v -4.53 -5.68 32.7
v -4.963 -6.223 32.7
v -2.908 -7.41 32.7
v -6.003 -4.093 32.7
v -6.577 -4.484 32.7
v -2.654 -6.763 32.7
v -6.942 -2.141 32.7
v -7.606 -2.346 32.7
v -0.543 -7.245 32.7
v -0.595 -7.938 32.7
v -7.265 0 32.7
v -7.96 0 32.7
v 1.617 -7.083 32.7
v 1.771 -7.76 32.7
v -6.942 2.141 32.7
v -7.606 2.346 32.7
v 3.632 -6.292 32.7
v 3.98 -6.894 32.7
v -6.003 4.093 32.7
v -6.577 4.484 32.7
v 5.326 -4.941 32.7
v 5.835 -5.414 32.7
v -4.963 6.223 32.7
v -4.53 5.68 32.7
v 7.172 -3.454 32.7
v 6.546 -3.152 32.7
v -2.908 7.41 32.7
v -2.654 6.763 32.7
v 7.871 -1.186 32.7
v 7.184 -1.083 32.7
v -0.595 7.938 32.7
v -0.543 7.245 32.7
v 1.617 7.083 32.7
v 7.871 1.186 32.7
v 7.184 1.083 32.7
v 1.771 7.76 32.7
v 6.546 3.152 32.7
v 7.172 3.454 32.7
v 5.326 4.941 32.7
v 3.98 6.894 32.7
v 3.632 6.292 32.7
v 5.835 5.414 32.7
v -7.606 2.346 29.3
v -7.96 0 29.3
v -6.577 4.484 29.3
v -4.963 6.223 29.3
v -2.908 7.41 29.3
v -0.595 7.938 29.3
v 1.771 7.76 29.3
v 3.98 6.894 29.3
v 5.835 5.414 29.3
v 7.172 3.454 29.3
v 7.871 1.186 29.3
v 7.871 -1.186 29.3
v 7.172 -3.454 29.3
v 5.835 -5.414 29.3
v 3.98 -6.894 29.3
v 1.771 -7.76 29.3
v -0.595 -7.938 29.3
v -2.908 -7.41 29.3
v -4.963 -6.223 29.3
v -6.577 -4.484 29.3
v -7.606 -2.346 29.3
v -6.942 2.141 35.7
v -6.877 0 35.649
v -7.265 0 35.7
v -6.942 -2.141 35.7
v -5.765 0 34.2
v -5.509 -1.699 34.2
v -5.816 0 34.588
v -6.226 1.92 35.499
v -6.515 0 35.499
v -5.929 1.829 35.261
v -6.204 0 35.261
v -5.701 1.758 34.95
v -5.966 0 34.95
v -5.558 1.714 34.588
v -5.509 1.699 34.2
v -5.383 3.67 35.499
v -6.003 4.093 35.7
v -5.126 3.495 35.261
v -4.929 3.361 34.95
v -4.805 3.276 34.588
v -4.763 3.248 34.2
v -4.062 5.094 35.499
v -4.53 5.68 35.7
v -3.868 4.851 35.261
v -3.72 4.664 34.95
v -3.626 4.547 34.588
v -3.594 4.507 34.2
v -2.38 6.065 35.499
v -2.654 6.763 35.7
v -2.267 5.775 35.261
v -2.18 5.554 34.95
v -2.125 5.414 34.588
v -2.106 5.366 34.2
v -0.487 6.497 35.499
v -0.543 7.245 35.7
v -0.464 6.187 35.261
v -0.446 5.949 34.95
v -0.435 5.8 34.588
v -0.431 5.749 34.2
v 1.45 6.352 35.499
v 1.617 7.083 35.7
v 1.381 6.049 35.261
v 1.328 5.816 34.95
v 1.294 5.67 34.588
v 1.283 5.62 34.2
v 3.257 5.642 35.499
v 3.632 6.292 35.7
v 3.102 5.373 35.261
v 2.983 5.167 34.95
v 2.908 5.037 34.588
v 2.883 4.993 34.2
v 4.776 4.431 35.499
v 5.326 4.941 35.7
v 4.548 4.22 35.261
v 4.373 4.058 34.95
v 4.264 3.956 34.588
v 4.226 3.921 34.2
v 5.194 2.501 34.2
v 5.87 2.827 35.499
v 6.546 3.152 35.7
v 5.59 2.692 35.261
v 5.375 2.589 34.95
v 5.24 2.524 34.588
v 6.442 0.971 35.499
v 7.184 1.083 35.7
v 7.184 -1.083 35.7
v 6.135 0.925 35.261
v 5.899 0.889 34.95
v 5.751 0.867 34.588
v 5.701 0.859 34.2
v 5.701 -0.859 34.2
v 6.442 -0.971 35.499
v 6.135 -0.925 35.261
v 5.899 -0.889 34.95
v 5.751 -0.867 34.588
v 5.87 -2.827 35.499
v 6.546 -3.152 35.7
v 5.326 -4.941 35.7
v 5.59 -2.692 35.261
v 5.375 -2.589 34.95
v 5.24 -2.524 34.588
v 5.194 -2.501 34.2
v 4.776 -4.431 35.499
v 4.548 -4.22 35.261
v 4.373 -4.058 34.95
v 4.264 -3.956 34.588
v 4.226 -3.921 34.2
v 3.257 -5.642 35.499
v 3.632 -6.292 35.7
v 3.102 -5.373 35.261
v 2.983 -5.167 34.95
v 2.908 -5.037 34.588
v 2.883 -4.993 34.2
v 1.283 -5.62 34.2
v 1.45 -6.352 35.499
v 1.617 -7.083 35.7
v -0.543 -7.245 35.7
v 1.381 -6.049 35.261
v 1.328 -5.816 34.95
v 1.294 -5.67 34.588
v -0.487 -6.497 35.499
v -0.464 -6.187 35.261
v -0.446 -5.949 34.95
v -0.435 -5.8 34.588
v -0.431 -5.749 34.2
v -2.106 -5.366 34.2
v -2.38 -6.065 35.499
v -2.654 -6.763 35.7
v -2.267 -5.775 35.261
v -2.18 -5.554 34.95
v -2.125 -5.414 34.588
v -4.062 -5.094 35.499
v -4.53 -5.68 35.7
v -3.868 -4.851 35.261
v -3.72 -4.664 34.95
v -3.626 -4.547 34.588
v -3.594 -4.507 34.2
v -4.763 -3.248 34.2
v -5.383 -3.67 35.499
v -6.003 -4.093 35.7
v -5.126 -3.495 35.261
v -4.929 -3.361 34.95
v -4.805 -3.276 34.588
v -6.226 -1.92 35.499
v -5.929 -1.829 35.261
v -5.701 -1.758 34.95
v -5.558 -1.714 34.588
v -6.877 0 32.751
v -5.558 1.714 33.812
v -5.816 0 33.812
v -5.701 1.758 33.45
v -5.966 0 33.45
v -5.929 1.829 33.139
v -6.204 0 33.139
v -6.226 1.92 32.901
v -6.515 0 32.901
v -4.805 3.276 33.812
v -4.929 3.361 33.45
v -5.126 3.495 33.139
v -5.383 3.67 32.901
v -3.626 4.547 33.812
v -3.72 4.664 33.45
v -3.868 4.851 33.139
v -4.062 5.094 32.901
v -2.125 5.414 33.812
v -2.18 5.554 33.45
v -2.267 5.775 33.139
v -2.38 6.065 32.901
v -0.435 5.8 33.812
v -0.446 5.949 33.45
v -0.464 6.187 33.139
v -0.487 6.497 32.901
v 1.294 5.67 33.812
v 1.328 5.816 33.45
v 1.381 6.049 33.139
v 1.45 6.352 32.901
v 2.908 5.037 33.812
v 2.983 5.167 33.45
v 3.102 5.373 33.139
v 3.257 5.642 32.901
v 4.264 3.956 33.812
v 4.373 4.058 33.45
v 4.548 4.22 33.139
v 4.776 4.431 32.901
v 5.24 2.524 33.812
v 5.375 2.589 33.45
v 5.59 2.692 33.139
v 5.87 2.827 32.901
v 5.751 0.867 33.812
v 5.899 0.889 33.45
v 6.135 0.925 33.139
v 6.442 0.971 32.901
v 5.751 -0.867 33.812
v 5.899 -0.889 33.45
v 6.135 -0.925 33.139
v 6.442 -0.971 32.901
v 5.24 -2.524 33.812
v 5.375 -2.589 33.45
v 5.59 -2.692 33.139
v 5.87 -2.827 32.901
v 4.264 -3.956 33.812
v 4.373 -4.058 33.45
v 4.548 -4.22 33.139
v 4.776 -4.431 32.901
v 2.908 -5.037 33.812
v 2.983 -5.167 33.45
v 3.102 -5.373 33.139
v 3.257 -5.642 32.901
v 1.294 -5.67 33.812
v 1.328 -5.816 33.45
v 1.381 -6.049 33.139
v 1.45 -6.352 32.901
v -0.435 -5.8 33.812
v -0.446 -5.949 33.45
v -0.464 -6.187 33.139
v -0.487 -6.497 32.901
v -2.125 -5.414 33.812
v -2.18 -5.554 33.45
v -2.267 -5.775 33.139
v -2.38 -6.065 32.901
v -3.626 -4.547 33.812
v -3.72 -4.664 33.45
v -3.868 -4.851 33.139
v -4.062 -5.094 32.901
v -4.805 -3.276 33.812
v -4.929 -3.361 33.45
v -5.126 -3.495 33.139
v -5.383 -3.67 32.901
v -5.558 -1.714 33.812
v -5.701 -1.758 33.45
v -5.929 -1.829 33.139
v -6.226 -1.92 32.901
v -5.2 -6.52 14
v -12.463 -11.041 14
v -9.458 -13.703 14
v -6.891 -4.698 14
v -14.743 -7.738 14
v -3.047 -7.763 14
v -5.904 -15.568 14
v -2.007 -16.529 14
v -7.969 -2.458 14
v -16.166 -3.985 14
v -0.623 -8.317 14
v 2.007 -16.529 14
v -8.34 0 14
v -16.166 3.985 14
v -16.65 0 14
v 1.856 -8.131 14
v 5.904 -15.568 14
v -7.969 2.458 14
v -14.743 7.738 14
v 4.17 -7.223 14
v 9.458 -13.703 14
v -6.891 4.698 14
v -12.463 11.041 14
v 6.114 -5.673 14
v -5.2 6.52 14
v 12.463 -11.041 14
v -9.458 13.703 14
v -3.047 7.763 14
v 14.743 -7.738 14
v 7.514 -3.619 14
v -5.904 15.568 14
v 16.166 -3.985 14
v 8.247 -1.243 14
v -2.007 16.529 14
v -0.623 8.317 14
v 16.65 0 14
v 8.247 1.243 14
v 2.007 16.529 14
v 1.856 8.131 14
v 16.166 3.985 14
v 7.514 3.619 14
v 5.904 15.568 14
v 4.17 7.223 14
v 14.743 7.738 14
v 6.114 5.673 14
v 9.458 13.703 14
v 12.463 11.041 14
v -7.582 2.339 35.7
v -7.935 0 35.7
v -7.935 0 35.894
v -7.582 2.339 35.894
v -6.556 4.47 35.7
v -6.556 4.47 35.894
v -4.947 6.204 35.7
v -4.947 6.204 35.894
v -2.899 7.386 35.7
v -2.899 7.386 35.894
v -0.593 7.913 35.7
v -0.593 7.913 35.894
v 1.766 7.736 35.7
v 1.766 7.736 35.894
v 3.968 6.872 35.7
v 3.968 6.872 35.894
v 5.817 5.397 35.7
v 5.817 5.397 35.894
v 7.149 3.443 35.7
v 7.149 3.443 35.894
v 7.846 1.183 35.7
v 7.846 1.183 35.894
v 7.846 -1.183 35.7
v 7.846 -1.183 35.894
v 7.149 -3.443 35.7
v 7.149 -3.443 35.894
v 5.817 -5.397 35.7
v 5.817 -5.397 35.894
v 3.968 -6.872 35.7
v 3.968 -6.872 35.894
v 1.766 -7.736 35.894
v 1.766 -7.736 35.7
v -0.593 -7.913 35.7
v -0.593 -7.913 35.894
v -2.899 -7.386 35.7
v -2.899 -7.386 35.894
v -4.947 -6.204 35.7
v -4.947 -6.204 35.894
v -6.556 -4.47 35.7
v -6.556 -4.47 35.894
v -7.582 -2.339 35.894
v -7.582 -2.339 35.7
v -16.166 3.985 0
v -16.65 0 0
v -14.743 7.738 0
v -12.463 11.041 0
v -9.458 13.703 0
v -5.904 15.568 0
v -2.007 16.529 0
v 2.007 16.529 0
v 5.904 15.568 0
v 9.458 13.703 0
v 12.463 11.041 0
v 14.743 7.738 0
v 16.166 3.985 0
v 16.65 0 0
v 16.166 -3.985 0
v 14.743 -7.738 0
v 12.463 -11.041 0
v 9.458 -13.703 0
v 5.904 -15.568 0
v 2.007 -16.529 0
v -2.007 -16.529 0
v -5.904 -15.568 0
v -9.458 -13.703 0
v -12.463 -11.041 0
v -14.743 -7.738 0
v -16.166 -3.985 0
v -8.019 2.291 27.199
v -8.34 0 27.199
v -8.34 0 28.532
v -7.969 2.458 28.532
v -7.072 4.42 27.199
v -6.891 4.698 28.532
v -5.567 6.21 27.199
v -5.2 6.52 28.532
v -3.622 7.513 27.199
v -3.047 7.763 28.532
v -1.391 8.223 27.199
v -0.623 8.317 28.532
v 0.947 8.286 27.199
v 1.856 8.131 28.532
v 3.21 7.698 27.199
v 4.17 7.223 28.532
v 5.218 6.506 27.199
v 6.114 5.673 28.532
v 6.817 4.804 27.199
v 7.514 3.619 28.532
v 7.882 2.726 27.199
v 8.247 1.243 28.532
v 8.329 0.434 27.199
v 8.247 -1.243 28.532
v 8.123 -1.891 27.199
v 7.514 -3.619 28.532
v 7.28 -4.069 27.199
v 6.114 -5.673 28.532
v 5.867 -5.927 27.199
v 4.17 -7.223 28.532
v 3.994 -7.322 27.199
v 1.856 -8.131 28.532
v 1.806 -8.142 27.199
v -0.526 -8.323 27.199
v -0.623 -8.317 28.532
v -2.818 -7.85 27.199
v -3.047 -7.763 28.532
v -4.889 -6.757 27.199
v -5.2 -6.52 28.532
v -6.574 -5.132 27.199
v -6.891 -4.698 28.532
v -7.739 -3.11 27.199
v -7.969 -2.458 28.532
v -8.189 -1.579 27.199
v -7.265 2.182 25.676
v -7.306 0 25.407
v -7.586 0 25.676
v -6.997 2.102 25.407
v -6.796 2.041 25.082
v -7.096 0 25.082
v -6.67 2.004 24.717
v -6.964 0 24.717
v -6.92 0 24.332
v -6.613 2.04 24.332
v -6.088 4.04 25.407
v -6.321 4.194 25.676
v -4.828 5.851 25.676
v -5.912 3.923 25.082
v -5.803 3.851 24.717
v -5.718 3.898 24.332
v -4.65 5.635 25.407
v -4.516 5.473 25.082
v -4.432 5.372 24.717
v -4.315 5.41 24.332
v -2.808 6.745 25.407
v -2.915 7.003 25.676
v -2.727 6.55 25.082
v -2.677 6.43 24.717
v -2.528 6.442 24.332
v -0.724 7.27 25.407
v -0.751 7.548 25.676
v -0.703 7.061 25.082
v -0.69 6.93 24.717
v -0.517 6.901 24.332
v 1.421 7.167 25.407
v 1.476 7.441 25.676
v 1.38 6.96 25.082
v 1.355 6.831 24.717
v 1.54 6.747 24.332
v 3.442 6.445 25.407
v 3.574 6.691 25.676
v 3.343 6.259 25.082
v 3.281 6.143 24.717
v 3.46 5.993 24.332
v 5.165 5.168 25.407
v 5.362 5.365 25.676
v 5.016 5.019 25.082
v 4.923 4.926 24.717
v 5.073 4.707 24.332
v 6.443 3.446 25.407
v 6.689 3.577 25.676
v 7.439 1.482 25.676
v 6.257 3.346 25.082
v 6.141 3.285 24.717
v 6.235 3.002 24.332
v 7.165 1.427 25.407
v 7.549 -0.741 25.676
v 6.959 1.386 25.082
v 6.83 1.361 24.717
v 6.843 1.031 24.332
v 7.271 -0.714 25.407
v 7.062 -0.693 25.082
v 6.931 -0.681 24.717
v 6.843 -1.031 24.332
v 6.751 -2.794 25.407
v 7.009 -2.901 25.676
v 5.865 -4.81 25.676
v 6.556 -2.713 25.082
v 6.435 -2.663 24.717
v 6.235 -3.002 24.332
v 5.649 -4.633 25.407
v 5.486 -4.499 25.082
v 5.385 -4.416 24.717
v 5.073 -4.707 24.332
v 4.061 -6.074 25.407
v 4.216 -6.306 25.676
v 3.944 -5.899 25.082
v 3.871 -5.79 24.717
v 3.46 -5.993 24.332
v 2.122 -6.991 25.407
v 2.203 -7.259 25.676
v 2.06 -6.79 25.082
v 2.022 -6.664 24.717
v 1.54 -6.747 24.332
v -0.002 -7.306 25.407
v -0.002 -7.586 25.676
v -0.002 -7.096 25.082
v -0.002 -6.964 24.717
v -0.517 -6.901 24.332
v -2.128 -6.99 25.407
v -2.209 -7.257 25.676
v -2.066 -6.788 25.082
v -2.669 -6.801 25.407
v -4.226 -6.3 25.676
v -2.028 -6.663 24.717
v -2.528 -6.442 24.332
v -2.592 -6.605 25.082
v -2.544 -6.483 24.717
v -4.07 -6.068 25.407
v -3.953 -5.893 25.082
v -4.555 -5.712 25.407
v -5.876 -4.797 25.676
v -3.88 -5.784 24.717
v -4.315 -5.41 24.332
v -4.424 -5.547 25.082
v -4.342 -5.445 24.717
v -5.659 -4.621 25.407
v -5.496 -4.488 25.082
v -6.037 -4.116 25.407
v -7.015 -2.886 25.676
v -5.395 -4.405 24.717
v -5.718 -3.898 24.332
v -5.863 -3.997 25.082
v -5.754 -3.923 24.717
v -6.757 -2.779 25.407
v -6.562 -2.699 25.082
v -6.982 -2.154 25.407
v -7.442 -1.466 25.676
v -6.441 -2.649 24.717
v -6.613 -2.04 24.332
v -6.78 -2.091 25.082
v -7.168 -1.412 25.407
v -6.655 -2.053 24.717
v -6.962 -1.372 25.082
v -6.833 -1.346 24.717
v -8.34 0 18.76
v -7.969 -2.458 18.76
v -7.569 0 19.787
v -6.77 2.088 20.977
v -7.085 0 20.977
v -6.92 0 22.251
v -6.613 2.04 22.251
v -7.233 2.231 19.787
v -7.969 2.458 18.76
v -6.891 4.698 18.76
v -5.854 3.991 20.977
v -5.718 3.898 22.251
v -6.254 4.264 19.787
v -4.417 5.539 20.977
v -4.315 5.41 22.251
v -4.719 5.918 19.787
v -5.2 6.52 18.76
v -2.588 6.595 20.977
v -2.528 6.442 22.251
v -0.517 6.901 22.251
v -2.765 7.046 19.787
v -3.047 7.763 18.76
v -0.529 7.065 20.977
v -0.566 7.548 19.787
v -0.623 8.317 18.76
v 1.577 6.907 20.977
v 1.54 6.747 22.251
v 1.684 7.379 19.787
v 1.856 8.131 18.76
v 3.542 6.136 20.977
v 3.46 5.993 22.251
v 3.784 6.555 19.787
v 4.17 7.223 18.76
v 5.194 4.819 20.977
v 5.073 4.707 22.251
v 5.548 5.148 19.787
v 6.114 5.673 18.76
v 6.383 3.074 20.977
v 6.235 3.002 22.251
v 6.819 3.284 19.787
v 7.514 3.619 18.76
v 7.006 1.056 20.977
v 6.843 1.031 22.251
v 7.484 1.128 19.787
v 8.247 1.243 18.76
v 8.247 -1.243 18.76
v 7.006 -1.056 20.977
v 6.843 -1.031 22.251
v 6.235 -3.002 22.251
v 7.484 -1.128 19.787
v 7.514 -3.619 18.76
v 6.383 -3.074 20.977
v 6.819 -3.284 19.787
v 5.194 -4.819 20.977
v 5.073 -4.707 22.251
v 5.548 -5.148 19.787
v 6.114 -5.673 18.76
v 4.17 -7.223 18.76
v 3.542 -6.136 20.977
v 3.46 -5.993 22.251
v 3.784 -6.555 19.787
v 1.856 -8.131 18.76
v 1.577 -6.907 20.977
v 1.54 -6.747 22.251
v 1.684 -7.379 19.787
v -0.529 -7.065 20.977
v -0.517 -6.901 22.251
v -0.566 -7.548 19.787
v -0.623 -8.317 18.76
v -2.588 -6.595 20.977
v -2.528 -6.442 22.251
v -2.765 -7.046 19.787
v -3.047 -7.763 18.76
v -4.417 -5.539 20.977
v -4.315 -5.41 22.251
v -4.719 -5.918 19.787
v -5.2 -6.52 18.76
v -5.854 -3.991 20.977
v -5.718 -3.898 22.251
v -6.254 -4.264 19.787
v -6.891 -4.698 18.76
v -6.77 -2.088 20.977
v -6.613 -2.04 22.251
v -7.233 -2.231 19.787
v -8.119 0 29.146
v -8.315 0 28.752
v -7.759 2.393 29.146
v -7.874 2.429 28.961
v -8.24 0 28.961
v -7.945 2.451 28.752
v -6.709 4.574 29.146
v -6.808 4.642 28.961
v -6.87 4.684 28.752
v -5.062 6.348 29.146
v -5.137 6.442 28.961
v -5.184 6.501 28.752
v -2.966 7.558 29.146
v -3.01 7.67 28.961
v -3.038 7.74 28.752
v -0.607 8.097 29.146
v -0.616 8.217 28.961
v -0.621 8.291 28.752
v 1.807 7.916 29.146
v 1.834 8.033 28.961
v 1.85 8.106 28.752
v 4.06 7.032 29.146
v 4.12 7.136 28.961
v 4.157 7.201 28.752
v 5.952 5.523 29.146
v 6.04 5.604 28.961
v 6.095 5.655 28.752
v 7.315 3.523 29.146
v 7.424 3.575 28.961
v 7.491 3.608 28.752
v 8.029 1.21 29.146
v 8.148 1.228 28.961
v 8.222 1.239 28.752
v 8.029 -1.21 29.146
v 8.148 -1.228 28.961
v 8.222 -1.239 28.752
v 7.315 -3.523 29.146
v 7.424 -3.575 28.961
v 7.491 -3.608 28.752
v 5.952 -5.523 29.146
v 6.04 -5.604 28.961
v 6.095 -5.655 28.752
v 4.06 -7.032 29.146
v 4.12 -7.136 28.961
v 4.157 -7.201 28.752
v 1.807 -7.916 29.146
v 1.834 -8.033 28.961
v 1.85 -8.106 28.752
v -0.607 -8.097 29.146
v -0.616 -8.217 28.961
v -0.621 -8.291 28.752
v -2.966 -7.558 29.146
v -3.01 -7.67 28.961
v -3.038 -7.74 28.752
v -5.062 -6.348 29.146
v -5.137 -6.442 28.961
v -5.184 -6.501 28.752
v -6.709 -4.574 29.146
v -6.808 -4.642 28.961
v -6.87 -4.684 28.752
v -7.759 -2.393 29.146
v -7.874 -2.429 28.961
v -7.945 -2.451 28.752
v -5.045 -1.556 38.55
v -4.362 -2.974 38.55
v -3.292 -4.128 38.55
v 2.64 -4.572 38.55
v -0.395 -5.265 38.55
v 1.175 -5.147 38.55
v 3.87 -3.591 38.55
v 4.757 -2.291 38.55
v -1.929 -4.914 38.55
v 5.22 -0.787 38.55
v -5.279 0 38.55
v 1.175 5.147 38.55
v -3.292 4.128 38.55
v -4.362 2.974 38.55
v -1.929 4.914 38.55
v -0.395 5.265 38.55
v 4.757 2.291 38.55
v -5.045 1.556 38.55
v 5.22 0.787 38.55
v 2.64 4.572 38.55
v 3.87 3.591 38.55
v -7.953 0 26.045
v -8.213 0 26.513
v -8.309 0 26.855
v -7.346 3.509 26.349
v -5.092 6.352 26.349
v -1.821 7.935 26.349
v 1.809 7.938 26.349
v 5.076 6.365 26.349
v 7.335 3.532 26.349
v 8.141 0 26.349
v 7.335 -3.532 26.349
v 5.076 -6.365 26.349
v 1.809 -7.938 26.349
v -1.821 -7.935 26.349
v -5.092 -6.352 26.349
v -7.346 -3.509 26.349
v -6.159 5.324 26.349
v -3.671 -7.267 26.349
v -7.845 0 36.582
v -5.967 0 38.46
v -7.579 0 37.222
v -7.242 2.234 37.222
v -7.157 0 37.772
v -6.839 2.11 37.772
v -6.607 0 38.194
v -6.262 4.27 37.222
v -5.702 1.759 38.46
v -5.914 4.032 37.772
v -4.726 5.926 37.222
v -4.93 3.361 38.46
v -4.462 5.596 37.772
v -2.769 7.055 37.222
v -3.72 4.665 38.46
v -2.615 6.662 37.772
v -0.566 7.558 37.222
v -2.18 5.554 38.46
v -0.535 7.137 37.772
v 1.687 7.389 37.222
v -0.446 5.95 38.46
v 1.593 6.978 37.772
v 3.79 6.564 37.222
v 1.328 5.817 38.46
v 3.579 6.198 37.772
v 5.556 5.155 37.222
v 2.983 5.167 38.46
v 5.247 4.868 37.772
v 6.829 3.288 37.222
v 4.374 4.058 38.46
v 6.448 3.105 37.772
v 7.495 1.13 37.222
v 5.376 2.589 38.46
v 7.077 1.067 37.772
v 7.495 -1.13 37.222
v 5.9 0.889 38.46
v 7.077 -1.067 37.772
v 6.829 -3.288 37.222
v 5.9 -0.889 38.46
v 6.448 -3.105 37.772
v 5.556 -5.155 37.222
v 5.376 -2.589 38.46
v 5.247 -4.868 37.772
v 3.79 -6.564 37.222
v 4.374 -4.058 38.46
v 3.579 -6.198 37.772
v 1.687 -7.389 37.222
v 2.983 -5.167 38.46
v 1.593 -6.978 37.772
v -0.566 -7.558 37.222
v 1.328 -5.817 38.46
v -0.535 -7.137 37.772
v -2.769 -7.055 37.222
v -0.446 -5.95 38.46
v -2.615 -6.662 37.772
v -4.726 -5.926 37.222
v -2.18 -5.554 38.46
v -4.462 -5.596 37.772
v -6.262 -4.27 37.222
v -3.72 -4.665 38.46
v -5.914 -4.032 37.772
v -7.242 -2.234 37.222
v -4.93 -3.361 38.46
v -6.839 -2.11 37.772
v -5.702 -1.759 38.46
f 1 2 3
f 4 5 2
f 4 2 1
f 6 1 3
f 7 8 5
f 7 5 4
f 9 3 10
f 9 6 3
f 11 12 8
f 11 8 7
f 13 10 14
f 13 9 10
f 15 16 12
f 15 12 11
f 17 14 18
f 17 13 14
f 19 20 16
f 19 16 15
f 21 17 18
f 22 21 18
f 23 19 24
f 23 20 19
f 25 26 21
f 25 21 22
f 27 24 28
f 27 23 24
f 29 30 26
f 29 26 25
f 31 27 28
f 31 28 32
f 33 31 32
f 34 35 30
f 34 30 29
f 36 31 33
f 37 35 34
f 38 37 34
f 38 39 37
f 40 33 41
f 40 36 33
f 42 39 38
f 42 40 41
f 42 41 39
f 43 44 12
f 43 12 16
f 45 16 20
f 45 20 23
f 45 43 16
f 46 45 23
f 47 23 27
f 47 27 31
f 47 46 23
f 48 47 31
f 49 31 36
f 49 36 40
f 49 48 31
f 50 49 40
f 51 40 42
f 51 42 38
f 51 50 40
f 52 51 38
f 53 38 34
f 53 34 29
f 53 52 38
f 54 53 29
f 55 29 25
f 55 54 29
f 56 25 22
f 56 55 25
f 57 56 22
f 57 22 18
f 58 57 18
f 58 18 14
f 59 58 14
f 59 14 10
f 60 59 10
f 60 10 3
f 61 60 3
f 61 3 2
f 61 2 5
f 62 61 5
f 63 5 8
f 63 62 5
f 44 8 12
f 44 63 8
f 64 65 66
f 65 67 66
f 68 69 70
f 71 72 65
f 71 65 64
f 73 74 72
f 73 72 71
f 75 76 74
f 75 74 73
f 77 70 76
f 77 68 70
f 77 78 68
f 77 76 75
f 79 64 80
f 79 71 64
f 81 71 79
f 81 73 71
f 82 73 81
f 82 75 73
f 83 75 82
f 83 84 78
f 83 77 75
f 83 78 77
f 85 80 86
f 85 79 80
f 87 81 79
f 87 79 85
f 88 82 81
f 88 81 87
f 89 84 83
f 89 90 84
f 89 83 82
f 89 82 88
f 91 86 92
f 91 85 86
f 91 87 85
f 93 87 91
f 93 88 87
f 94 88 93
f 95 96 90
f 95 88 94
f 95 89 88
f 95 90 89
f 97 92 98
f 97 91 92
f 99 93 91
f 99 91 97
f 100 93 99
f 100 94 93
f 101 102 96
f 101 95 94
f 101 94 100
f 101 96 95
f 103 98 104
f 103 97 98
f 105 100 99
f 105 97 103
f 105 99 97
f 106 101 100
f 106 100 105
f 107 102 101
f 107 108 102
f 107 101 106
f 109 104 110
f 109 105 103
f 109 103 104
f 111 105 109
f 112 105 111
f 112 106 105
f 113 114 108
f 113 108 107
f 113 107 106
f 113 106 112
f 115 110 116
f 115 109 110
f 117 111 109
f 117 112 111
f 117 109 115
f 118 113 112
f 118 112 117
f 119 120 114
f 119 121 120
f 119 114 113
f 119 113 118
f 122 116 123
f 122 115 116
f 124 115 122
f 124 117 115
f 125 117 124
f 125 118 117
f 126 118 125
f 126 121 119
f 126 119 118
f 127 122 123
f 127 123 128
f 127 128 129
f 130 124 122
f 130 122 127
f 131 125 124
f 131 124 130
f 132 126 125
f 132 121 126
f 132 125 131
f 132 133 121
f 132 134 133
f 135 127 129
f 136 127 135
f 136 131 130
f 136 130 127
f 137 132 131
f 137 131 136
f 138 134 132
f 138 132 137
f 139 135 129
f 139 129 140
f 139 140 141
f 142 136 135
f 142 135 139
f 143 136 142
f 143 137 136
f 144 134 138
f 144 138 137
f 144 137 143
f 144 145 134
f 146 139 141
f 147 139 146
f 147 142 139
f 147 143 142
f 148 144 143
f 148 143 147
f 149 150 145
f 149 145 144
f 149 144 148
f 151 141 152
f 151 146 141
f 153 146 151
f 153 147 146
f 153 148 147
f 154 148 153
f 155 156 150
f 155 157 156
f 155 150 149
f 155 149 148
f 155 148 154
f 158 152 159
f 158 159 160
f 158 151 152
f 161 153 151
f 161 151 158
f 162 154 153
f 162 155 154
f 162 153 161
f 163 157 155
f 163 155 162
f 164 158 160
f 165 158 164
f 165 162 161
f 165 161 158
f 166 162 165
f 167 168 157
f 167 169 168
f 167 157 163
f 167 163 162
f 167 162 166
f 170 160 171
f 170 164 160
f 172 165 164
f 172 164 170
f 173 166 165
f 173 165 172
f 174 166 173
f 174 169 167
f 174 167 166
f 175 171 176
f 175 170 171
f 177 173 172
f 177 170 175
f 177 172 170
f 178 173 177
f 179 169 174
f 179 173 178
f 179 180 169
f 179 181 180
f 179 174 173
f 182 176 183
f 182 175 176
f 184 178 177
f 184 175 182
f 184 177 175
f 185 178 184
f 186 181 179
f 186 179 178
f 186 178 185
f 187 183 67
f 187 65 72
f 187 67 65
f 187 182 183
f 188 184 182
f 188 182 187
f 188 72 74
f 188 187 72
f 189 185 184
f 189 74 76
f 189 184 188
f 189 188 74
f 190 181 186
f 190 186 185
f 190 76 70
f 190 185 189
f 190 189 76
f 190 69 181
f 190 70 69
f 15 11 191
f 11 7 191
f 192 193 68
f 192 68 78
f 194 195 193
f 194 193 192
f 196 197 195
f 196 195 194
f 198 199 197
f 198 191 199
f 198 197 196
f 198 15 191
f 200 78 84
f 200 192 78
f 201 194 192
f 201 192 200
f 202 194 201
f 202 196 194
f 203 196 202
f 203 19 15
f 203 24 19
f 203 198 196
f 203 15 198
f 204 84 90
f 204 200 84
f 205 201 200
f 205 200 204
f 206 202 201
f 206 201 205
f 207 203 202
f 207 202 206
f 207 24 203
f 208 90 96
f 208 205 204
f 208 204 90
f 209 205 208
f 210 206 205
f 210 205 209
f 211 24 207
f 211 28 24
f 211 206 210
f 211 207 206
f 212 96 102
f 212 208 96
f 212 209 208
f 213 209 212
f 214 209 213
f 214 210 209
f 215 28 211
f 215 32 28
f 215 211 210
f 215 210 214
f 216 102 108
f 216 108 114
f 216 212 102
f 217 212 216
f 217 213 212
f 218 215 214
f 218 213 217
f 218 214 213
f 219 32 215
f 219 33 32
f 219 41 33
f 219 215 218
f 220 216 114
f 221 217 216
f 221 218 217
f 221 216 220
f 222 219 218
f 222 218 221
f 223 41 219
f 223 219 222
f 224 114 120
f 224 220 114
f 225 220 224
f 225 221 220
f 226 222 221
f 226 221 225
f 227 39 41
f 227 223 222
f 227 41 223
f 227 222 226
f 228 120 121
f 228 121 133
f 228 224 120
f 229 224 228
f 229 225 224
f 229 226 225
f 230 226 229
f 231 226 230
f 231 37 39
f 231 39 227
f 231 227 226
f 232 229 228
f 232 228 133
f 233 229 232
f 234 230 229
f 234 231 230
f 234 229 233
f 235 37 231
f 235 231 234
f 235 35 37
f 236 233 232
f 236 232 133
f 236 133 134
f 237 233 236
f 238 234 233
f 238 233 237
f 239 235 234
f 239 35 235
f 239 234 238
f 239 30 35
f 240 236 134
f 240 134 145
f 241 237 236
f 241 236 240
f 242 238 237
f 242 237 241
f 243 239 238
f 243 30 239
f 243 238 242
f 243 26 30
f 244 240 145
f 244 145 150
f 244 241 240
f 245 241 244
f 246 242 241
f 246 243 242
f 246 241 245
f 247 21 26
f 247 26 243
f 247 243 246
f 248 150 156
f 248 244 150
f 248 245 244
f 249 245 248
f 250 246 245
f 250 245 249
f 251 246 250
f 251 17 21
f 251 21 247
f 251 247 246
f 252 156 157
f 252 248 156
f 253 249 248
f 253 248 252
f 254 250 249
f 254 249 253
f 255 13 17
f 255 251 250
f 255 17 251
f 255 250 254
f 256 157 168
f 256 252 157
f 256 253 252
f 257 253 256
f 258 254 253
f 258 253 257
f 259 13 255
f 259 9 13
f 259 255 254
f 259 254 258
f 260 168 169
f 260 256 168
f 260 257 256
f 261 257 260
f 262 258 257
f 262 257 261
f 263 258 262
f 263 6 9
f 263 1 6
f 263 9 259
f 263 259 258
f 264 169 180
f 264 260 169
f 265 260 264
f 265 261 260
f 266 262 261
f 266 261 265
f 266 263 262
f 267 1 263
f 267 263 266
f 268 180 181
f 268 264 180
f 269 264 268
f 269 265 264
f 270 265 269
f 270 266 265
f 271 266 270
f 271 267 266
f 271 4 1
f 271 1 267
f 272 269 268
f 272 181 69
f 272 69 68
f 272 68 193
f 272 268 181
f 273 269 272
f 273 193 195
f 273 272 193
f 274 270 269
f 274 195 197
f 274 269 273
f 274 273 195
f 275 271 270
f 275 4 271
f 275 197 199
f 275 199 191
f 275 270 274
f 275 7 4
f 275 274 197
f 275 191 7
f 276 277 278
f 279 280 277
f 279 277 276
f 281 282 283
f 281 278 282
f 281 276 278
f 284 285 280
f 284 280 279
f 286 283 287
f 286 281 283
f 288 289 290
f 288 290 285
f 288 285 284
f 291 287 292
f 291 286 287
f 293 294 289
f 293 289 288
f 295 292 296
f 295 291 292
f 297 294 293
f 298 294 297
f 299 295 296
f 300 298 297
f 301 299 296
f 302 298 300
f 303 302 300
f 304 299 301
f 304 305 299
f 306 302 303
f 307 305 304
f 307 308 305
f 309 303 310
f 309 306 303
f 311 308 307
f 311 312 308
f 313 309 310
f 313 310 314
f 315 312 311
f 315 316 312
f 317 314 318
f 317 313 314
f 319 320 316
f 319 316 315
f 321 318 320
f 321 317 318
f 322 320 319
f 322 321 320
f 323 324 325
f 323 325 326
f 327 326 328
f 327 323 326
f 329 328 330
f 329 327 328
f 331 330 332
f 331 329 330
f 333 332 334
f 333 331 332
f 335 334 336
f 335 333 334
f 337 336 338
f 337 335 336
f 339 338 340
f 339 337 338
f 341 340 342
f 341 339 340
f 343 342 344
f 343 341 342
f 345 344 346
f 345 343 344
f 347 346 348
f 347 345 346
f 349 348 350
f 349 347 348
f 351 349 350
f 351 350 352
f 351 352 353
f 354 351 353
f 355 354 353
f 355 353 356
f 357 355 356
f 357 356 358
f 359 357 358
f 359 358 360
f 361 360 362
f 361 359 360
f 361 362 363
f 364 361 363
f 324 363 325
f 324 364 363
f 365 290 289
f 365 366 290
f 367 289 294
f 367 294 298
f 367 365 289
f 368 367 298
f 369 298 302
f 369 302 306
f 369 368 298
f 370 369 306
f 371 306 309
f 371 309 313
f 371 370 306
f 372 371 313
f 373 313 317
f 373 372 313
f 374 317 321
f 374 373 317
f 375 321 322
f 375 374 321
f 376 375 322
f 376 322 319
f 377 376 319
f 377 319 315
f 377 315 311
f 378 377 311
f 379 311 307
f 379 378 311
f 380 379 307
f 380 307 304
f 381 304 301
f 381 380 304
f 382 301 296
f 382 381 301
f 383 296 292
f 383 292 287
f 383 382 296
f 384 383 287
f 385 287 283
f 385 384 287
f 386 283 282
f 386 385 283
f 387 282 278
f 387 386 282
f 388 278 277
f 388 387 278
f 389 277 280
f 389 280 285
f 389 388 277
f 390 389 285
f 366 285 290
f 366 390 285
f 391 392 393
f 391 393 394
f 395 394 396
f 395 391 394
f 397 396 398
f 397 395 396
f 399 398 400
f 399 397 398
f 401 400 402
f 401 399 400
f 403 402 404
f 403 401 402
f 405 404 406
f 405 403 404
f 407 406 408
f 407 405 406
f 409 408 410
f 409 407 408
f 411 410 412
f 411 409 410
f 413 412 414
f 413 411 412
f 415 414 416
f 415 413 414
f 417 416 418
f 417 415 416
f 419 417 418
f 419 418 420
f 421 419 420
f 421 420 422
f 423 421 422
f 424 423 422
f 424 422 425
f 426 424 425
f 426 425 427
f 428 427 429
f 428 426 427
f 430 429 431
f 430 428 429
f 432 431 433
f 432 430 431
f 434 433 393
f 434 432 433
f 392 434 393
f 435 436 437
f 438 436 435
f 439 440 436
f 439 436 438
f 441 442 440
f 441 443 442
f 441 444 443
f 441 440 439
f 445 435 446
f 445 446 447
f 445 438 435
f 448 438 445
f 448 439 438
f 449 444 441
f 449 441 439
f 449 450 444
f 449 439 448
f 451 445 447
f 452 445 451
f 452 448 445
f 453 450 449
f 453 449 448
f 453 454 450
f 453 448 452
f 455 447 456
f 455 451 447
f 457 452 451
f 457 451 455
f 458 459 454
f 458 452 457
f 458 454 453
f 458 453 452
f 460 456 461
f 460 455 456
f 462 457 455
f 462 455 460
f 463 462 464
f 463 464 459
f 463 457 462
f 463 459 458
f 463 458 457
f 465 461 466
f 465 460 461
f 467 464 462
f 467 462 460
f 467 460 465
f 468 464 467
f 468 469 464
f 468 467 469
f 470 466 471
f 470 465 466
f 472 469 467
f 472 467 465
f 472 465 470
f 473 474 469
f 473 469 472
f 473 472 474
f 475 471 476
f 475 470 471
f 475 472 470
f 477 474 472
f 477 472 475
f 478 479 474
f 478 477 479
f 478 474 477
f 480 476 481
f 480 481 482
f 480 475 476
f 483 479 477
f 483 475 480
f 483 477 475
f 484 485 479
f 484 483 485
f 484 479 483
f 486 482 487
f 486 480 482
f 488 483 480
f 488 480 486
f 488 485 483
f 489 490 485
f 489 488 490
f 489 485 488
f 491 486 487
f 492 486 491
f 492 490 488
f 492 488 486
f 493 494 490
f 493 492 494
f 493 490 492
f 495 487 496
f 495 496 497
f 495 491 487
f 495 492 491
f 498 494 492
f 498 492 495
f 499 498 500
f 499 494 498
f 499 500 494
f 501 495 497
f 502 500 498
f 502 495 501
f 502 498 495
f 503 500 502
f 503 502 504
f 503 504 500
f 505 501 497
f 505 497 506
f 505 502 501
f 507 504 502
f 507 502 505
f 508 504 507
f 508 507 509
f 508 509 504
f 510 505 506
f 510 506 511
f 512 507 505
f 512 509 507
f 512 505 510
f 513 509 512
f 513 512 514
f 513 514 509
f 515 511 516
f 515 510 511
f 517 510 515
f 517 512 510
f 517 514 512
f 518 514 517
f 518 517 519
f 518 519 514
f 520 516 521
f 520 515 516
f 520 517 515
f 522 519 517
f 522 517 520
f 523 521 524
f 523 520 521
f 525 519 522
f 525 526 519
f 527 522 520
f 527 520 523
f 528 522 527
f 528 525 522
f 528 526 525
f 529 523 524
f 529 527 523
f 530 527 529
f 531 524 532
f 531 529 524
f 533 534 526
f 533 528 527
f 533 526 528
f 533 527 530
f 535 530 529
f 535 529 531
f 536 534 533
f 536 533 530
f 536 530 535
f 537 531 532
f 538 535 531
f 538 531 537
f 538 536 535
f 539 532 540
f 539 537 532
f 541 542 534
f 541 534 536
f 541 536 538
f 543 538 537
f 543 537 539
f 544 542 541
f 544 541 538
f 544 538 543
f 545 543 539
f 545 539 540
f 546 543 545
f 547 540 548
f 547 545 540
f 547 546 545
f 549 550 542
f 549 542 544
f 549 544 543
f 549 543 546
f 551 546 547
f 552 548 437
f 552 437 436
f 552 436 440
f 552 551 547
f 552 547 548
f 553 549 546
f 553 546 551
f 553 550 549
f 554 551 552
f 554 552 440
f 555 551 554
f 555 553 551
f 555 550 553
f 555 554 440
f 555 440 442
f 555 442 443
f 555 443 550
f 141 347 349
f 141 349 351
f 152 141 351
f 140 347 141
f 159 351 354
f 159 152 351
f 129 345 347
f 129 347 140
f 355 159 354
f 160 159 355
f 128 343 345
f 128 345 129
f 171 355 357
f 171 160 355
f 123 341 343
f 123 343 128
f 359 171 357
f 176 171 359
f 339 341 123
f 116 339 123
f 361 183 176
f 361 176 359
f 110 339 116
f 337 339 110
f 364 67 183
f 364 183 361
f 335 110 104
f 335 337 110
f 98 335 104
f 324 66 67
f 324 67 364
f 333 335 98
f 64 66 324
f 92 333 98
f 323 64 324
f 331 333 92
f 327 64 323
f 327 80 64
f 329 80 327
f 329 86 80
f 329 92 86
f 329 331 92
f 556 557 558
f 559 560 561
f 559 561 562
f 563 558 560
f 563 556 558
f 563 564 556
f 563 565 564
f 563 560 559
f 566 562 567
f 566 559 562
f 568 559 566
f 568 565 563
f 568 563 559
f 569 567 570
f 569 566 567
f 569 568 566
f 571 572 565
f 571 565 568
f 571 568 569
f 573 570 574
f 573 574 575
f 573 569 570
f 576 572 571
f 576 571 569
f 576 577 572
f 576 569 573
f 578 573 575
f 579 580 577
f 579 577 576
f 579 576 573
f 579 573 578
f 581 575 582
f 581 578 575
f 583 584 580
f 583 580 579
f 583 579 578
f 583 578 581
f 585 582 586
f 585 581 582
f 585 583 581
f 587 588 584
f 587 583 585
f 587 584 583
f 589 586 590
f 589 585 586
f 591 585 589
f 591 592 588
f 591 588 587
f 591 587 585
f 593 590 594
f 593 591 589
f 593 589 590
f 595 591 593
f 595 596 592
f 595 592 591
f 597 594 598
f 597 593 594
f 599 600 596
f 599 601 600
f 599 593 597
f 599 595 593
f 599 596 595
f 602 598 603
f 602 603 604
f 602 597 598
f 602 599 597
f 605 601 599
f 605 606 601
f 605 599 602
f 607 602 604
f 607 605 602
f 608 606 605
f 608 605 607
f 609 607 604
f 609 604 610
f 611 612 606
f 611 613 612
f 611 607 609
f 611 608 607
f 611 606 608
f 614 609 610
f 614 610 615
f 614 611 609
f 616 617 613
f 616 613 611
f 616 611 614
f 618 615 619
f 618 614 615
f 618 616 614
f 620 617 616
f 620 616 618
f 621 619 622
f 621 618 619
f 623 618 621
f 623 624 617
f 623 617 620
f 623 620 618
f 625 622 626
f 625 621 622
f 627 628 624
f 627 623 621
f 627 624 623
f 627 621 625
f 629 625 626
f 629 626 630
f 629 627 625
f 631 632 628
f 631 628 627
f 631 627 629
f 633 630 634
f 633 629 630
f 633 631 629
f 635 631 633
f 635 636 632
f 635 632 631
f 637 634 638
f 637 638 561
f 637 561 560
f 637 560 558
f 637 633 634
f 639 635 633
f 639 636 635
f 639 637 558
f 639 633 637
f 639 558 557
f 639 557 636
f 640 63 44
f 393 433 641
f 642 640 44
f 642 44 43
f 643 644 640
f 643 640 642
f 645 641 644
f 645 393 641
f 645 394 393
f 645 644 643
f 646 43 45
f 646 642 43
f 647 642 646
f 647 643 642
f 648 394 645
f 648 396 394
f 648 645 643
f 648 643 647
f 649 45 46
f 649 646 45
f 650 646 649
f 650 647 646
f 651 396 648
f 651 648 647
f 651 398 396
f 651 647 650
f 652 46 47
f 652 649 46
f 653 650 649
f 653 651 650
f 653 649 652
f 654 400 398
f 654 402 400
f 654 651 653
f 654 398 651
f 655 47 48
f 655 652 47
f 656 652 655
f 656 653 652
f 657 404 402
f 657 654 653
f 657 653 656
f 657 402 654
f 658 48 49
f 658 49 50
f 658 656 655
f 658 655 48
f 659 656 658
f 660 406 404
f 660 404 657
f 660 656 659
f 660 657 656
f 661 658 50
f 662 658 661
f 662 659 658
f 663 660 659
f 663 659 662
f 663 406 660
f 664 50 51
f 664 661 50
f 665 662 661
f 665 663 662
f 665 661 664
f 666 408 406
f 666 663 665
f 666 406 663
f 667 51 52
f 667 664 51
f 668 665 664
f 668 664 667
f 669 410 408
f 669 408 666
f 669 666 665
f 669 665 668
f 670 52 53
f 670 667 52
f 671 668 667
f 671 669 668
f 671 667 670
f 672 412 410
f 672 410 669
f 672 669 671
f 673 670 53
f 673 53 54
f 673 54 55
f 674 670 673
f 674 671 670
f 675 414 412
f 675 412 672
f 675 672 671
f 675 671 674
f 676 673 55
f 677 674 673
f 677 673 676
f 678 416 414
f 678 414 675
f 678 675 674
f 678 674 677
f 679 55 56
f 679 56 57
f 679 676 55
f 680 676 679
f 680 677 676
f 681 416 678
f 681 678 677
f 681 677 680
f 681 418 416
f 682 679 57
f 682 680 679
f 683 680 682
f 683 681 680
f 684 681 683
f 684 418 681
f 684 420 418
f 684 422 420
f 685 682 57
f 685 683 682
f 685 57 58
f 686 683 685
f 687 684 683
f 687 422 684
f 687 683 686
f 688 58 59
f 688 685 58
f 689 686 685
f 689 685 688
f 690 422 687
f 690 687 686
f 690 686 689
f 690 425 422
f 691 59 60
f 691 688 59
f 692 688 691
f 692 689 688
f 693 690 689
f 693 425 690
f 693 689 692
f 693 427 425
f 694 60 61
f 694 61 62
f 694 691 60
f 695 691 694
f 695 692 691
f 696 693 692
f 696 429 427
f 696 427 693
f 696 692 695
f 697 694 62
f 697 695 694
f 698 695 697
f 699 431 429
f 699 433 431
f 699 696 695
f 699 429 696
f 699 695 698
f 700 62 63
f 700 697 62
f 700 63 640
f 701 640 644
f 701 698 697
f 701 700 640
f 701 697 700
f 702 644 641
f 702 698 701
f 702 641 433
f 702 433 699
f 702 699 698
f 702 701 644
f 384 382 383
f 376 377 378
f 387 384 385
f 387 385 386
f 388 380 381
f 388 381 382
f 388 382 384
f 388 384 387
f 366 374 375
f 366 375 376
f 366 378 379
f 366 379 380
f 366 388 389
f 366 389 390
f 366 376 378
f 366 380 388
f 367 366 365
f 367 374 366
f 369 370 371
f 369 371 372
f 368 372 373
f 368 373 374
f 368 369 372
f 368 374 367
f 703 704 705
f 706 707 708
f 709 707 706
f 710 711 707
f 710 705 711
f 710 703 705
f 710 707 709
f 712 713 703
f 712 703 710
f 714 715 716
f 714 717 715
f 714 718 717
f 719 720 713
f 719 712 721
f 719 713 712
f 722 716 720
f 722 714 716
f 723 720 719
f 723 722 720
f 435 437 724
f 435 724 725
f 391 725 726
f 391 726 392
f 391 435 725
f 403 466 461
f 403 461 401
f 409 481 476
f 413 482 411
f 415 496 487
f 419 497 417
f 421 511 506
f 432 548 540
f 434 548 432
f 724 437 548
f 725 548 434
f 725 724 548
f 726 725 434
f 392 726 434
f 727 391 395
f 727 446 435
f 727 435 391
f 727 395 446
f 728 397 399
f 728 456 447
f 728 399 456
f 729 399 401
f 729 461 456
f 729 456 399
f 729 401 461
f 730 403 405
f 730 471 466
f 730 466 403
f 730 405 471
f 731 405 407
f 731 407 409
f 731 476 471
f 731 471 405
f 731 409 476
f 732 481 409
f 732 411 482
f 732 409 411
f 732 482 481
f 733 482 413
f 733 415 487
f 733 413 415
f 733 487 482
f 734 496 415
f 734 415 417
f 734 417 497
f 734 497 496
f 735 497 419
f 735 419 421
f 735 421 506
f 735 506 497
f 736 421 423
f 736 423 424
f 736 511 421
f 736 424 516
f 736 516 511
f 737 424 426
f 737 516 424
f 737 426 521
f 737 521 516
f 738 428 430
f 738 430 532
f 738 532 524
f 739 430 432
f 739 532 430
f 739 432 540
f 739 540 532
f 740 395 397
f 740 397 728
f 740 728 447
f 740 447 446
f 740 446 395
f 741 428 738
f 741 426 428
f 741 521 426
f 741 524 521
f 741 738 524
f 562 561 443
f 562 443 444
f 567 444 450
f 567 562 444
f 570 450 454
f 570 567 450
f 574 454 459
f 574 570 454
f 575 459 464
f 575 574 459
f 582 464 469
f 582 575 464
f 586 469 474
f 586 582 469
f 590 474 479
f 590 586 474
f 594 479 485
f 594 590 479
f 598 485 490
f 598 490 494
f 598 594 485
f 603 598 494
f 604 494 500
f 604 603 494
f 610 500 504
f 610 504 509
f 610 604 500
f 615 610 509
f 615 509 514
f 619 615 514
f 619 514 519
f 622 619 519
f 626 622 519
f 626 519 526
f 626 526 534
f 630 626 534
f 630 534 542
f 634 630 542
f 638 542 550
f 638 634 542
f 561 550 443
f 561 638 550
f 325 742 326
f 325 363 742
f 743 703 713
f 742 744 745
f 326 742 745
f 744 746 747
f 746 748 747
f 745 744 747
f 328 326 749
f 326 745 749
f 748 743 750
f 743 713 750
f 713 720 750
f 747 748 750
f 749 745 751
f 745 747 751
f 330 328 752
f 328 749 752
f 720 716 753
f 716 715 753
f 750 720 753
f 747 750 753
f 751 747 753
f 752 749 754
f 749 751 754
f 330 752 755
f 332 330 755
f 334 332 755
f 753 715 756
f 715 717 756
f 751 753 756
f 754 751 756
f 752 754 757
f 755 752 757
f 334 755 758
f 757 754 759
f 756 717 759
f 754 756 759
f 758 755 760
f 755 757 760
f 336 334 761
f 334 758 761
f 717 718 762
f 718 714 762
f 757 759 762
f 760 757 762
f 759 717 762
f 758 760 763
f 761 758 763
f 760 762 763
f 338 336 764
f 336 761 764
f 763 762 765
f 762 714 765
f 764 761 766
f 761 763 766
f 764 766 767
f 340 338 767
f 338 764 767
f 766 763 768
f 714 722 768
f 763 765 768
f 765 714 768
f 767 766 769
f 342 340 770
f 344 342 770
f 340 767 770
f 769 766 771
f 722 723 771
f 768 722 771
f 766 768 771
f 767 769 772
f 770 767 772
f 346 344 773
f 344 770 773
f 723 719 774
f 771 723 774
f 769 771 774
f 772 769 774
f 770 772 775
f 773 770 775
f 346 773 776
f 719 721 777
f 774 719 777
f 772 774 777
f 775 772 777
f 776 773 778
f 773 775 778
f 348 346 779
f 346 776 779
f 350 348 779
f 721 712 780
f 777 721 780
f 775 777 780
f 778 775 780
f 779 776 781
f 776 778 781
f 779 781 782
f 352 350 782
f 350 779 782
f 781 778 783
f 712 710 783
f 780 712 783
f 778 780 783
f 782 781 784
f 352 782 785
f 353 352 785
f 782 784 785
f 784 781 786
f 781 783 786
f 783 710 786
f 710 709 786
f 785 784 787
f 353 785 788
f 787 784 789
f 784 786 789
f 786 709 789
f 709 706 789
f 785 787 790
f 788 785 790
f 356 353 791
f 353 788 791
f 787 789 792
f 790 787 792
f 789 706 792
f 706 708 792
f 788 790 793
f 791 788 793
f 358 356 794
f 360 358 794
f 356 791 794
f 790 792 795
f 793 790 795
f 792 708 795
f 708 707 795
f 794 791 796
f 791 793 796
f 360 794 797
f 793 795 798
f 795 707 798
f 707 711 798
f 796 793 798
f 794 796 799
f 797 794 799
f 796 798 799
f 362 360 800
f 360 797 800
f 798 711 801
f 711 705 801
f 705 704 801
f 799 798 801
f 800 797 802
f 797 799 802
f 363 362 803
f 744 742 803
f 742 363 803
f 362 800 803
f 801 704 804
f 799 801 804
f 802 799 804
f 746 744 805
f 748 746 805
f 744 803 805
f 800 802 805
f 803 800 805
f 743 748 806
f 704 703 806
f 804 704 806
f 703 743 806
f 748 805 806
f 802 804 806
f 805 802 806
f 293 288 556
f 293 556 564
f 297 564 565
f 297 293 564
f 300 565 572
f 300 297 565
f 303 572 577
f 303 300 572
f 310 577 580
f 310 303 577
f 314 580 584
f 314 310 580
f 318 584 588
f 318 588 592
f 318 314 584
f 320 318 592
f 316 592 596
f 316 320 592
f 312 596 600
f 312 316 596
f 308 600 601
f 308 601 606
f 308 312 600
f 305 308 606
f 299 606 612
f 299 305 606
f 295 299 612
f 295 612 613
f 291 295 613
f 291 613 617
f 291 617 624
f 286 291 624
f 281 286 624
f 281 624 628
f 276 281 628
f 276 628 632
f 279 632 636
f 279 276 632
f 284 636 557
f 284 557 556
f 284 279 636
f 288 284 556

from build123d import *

# Parameters (mm, degrees)
F2_R = 1.49999
F6_R = 1.9156322051
F7_R = 2.6556349186


# Not quite as in the source:
# - a fillet or chamfer that OpenCascade refuses, or shapes differently, is made with other operations: its cross-section is extruded or revolved along the edge and cut away or added
# - a fillet or chamfer is up to 0.001 mm smaller than in the source, because OpenCascade refuses the exact size


with BuildPart() as f1:
    # F0 (on Front) → F1 (revolve)
    with BuildSketch(Plane.XZ):
        Polygon((-16.65, 0), (0, 0), (0, 38.55), (-7.935, 38.55), (-7.935, 35.7), (-5.765, 35.7), (-5.765, 32.7), (-7.96, 32.7), (-7.96, 29.3), (-8.34, 29.3), (-8.34, 26), (-6.92, 26), (-6.92, 18.76), (-8.34, 18.76), (-8.34, 14), (-16.65, 14), align=None)
    revolve(axis=Axis((0, 0, 19.275), (0, 0, -1)))

    # F2 (radius 1.5 in the source; OpenCascade refuses exactly that, so slightly less here)
    f2_edges = [f1.edges().sort_by_distance(p)[0] for p in [
        (5.765, 0, 32.7),
        (5.765, 0, 35.7),
    ]]
    fillet(f2_edges, radius=F2_R)

    # F3: fillet of radius 1.6899494937 on 1 edges, made by hand

    # F3_s1 → F3_t2 (revolve)
    with BuildSketch(Plane.XZ):
        with BuildLine():
            ThreePointArc((-8.34, 26), (-7.3230675447, 25.4271335519), (-6.92, 24.3317504497))
            Line((-6.92, 24.3317504497), (-6.92, 26))
            Line((-6.92, 26), (-8.34, 26))
        make_face()
    revolve(axis=Axis((0, 0, 26), (0, 0, -1)))

    # F4: fillet of radius 0.9656854249 on 1 edges, made by hand

    # F4_s1 → F4_t2 (revolve, cut)
    with BuildSketch(Plane.XZ):
        with BuildLine():
            ThreePointArc((-7.96, 29.3), (-8.2398017842, 28.9605432653), (-8.34, 28.5321973411))
            Line((-8.34, 28.5321973411), (-8.34, 29.3))
            Line((-8.34, 29.3), (-7.96, 29.3))
        make_face()
    revolve(axis=Axis((0, 0, 29.3), (0, 0, -1)), mode=Mode.SUBTRACT)

    # F5: fillet of radius 5 on 1 edges, made by hand

    # F5_s1 → F5_t2 (revolve)
    with BuildSketch(Plane.XZ):
        with BuildLine():
            ThreePointArc((-6.92, 22.2505013966), (-7.2885855292, 20.3663570285), (-8.34, 18.76))
            Line((-8.34, 18.76), (-6.92, 18.76))
            Line((-6.92, 18.76), (-6.92, 22.2505013966))
        make_face()
    revolve(axis=Axis((0, 0, 18.76), (0, 0, -1)))

    # F6
    f6_edges = [f1.edges().sort_by_distance(p)[0] for p in [
        (8.34, 0, 26),
    ]]
    fillet(f6_edges, radius=F6_R)

    # F7
    f7_edges = [f1.edges().sort_by_distance(p)[0] for p in [
        (7.935, 0, 38.55),
    ]]
    fillet(f7_edges, radius=F7_R)


solid = f1.part
